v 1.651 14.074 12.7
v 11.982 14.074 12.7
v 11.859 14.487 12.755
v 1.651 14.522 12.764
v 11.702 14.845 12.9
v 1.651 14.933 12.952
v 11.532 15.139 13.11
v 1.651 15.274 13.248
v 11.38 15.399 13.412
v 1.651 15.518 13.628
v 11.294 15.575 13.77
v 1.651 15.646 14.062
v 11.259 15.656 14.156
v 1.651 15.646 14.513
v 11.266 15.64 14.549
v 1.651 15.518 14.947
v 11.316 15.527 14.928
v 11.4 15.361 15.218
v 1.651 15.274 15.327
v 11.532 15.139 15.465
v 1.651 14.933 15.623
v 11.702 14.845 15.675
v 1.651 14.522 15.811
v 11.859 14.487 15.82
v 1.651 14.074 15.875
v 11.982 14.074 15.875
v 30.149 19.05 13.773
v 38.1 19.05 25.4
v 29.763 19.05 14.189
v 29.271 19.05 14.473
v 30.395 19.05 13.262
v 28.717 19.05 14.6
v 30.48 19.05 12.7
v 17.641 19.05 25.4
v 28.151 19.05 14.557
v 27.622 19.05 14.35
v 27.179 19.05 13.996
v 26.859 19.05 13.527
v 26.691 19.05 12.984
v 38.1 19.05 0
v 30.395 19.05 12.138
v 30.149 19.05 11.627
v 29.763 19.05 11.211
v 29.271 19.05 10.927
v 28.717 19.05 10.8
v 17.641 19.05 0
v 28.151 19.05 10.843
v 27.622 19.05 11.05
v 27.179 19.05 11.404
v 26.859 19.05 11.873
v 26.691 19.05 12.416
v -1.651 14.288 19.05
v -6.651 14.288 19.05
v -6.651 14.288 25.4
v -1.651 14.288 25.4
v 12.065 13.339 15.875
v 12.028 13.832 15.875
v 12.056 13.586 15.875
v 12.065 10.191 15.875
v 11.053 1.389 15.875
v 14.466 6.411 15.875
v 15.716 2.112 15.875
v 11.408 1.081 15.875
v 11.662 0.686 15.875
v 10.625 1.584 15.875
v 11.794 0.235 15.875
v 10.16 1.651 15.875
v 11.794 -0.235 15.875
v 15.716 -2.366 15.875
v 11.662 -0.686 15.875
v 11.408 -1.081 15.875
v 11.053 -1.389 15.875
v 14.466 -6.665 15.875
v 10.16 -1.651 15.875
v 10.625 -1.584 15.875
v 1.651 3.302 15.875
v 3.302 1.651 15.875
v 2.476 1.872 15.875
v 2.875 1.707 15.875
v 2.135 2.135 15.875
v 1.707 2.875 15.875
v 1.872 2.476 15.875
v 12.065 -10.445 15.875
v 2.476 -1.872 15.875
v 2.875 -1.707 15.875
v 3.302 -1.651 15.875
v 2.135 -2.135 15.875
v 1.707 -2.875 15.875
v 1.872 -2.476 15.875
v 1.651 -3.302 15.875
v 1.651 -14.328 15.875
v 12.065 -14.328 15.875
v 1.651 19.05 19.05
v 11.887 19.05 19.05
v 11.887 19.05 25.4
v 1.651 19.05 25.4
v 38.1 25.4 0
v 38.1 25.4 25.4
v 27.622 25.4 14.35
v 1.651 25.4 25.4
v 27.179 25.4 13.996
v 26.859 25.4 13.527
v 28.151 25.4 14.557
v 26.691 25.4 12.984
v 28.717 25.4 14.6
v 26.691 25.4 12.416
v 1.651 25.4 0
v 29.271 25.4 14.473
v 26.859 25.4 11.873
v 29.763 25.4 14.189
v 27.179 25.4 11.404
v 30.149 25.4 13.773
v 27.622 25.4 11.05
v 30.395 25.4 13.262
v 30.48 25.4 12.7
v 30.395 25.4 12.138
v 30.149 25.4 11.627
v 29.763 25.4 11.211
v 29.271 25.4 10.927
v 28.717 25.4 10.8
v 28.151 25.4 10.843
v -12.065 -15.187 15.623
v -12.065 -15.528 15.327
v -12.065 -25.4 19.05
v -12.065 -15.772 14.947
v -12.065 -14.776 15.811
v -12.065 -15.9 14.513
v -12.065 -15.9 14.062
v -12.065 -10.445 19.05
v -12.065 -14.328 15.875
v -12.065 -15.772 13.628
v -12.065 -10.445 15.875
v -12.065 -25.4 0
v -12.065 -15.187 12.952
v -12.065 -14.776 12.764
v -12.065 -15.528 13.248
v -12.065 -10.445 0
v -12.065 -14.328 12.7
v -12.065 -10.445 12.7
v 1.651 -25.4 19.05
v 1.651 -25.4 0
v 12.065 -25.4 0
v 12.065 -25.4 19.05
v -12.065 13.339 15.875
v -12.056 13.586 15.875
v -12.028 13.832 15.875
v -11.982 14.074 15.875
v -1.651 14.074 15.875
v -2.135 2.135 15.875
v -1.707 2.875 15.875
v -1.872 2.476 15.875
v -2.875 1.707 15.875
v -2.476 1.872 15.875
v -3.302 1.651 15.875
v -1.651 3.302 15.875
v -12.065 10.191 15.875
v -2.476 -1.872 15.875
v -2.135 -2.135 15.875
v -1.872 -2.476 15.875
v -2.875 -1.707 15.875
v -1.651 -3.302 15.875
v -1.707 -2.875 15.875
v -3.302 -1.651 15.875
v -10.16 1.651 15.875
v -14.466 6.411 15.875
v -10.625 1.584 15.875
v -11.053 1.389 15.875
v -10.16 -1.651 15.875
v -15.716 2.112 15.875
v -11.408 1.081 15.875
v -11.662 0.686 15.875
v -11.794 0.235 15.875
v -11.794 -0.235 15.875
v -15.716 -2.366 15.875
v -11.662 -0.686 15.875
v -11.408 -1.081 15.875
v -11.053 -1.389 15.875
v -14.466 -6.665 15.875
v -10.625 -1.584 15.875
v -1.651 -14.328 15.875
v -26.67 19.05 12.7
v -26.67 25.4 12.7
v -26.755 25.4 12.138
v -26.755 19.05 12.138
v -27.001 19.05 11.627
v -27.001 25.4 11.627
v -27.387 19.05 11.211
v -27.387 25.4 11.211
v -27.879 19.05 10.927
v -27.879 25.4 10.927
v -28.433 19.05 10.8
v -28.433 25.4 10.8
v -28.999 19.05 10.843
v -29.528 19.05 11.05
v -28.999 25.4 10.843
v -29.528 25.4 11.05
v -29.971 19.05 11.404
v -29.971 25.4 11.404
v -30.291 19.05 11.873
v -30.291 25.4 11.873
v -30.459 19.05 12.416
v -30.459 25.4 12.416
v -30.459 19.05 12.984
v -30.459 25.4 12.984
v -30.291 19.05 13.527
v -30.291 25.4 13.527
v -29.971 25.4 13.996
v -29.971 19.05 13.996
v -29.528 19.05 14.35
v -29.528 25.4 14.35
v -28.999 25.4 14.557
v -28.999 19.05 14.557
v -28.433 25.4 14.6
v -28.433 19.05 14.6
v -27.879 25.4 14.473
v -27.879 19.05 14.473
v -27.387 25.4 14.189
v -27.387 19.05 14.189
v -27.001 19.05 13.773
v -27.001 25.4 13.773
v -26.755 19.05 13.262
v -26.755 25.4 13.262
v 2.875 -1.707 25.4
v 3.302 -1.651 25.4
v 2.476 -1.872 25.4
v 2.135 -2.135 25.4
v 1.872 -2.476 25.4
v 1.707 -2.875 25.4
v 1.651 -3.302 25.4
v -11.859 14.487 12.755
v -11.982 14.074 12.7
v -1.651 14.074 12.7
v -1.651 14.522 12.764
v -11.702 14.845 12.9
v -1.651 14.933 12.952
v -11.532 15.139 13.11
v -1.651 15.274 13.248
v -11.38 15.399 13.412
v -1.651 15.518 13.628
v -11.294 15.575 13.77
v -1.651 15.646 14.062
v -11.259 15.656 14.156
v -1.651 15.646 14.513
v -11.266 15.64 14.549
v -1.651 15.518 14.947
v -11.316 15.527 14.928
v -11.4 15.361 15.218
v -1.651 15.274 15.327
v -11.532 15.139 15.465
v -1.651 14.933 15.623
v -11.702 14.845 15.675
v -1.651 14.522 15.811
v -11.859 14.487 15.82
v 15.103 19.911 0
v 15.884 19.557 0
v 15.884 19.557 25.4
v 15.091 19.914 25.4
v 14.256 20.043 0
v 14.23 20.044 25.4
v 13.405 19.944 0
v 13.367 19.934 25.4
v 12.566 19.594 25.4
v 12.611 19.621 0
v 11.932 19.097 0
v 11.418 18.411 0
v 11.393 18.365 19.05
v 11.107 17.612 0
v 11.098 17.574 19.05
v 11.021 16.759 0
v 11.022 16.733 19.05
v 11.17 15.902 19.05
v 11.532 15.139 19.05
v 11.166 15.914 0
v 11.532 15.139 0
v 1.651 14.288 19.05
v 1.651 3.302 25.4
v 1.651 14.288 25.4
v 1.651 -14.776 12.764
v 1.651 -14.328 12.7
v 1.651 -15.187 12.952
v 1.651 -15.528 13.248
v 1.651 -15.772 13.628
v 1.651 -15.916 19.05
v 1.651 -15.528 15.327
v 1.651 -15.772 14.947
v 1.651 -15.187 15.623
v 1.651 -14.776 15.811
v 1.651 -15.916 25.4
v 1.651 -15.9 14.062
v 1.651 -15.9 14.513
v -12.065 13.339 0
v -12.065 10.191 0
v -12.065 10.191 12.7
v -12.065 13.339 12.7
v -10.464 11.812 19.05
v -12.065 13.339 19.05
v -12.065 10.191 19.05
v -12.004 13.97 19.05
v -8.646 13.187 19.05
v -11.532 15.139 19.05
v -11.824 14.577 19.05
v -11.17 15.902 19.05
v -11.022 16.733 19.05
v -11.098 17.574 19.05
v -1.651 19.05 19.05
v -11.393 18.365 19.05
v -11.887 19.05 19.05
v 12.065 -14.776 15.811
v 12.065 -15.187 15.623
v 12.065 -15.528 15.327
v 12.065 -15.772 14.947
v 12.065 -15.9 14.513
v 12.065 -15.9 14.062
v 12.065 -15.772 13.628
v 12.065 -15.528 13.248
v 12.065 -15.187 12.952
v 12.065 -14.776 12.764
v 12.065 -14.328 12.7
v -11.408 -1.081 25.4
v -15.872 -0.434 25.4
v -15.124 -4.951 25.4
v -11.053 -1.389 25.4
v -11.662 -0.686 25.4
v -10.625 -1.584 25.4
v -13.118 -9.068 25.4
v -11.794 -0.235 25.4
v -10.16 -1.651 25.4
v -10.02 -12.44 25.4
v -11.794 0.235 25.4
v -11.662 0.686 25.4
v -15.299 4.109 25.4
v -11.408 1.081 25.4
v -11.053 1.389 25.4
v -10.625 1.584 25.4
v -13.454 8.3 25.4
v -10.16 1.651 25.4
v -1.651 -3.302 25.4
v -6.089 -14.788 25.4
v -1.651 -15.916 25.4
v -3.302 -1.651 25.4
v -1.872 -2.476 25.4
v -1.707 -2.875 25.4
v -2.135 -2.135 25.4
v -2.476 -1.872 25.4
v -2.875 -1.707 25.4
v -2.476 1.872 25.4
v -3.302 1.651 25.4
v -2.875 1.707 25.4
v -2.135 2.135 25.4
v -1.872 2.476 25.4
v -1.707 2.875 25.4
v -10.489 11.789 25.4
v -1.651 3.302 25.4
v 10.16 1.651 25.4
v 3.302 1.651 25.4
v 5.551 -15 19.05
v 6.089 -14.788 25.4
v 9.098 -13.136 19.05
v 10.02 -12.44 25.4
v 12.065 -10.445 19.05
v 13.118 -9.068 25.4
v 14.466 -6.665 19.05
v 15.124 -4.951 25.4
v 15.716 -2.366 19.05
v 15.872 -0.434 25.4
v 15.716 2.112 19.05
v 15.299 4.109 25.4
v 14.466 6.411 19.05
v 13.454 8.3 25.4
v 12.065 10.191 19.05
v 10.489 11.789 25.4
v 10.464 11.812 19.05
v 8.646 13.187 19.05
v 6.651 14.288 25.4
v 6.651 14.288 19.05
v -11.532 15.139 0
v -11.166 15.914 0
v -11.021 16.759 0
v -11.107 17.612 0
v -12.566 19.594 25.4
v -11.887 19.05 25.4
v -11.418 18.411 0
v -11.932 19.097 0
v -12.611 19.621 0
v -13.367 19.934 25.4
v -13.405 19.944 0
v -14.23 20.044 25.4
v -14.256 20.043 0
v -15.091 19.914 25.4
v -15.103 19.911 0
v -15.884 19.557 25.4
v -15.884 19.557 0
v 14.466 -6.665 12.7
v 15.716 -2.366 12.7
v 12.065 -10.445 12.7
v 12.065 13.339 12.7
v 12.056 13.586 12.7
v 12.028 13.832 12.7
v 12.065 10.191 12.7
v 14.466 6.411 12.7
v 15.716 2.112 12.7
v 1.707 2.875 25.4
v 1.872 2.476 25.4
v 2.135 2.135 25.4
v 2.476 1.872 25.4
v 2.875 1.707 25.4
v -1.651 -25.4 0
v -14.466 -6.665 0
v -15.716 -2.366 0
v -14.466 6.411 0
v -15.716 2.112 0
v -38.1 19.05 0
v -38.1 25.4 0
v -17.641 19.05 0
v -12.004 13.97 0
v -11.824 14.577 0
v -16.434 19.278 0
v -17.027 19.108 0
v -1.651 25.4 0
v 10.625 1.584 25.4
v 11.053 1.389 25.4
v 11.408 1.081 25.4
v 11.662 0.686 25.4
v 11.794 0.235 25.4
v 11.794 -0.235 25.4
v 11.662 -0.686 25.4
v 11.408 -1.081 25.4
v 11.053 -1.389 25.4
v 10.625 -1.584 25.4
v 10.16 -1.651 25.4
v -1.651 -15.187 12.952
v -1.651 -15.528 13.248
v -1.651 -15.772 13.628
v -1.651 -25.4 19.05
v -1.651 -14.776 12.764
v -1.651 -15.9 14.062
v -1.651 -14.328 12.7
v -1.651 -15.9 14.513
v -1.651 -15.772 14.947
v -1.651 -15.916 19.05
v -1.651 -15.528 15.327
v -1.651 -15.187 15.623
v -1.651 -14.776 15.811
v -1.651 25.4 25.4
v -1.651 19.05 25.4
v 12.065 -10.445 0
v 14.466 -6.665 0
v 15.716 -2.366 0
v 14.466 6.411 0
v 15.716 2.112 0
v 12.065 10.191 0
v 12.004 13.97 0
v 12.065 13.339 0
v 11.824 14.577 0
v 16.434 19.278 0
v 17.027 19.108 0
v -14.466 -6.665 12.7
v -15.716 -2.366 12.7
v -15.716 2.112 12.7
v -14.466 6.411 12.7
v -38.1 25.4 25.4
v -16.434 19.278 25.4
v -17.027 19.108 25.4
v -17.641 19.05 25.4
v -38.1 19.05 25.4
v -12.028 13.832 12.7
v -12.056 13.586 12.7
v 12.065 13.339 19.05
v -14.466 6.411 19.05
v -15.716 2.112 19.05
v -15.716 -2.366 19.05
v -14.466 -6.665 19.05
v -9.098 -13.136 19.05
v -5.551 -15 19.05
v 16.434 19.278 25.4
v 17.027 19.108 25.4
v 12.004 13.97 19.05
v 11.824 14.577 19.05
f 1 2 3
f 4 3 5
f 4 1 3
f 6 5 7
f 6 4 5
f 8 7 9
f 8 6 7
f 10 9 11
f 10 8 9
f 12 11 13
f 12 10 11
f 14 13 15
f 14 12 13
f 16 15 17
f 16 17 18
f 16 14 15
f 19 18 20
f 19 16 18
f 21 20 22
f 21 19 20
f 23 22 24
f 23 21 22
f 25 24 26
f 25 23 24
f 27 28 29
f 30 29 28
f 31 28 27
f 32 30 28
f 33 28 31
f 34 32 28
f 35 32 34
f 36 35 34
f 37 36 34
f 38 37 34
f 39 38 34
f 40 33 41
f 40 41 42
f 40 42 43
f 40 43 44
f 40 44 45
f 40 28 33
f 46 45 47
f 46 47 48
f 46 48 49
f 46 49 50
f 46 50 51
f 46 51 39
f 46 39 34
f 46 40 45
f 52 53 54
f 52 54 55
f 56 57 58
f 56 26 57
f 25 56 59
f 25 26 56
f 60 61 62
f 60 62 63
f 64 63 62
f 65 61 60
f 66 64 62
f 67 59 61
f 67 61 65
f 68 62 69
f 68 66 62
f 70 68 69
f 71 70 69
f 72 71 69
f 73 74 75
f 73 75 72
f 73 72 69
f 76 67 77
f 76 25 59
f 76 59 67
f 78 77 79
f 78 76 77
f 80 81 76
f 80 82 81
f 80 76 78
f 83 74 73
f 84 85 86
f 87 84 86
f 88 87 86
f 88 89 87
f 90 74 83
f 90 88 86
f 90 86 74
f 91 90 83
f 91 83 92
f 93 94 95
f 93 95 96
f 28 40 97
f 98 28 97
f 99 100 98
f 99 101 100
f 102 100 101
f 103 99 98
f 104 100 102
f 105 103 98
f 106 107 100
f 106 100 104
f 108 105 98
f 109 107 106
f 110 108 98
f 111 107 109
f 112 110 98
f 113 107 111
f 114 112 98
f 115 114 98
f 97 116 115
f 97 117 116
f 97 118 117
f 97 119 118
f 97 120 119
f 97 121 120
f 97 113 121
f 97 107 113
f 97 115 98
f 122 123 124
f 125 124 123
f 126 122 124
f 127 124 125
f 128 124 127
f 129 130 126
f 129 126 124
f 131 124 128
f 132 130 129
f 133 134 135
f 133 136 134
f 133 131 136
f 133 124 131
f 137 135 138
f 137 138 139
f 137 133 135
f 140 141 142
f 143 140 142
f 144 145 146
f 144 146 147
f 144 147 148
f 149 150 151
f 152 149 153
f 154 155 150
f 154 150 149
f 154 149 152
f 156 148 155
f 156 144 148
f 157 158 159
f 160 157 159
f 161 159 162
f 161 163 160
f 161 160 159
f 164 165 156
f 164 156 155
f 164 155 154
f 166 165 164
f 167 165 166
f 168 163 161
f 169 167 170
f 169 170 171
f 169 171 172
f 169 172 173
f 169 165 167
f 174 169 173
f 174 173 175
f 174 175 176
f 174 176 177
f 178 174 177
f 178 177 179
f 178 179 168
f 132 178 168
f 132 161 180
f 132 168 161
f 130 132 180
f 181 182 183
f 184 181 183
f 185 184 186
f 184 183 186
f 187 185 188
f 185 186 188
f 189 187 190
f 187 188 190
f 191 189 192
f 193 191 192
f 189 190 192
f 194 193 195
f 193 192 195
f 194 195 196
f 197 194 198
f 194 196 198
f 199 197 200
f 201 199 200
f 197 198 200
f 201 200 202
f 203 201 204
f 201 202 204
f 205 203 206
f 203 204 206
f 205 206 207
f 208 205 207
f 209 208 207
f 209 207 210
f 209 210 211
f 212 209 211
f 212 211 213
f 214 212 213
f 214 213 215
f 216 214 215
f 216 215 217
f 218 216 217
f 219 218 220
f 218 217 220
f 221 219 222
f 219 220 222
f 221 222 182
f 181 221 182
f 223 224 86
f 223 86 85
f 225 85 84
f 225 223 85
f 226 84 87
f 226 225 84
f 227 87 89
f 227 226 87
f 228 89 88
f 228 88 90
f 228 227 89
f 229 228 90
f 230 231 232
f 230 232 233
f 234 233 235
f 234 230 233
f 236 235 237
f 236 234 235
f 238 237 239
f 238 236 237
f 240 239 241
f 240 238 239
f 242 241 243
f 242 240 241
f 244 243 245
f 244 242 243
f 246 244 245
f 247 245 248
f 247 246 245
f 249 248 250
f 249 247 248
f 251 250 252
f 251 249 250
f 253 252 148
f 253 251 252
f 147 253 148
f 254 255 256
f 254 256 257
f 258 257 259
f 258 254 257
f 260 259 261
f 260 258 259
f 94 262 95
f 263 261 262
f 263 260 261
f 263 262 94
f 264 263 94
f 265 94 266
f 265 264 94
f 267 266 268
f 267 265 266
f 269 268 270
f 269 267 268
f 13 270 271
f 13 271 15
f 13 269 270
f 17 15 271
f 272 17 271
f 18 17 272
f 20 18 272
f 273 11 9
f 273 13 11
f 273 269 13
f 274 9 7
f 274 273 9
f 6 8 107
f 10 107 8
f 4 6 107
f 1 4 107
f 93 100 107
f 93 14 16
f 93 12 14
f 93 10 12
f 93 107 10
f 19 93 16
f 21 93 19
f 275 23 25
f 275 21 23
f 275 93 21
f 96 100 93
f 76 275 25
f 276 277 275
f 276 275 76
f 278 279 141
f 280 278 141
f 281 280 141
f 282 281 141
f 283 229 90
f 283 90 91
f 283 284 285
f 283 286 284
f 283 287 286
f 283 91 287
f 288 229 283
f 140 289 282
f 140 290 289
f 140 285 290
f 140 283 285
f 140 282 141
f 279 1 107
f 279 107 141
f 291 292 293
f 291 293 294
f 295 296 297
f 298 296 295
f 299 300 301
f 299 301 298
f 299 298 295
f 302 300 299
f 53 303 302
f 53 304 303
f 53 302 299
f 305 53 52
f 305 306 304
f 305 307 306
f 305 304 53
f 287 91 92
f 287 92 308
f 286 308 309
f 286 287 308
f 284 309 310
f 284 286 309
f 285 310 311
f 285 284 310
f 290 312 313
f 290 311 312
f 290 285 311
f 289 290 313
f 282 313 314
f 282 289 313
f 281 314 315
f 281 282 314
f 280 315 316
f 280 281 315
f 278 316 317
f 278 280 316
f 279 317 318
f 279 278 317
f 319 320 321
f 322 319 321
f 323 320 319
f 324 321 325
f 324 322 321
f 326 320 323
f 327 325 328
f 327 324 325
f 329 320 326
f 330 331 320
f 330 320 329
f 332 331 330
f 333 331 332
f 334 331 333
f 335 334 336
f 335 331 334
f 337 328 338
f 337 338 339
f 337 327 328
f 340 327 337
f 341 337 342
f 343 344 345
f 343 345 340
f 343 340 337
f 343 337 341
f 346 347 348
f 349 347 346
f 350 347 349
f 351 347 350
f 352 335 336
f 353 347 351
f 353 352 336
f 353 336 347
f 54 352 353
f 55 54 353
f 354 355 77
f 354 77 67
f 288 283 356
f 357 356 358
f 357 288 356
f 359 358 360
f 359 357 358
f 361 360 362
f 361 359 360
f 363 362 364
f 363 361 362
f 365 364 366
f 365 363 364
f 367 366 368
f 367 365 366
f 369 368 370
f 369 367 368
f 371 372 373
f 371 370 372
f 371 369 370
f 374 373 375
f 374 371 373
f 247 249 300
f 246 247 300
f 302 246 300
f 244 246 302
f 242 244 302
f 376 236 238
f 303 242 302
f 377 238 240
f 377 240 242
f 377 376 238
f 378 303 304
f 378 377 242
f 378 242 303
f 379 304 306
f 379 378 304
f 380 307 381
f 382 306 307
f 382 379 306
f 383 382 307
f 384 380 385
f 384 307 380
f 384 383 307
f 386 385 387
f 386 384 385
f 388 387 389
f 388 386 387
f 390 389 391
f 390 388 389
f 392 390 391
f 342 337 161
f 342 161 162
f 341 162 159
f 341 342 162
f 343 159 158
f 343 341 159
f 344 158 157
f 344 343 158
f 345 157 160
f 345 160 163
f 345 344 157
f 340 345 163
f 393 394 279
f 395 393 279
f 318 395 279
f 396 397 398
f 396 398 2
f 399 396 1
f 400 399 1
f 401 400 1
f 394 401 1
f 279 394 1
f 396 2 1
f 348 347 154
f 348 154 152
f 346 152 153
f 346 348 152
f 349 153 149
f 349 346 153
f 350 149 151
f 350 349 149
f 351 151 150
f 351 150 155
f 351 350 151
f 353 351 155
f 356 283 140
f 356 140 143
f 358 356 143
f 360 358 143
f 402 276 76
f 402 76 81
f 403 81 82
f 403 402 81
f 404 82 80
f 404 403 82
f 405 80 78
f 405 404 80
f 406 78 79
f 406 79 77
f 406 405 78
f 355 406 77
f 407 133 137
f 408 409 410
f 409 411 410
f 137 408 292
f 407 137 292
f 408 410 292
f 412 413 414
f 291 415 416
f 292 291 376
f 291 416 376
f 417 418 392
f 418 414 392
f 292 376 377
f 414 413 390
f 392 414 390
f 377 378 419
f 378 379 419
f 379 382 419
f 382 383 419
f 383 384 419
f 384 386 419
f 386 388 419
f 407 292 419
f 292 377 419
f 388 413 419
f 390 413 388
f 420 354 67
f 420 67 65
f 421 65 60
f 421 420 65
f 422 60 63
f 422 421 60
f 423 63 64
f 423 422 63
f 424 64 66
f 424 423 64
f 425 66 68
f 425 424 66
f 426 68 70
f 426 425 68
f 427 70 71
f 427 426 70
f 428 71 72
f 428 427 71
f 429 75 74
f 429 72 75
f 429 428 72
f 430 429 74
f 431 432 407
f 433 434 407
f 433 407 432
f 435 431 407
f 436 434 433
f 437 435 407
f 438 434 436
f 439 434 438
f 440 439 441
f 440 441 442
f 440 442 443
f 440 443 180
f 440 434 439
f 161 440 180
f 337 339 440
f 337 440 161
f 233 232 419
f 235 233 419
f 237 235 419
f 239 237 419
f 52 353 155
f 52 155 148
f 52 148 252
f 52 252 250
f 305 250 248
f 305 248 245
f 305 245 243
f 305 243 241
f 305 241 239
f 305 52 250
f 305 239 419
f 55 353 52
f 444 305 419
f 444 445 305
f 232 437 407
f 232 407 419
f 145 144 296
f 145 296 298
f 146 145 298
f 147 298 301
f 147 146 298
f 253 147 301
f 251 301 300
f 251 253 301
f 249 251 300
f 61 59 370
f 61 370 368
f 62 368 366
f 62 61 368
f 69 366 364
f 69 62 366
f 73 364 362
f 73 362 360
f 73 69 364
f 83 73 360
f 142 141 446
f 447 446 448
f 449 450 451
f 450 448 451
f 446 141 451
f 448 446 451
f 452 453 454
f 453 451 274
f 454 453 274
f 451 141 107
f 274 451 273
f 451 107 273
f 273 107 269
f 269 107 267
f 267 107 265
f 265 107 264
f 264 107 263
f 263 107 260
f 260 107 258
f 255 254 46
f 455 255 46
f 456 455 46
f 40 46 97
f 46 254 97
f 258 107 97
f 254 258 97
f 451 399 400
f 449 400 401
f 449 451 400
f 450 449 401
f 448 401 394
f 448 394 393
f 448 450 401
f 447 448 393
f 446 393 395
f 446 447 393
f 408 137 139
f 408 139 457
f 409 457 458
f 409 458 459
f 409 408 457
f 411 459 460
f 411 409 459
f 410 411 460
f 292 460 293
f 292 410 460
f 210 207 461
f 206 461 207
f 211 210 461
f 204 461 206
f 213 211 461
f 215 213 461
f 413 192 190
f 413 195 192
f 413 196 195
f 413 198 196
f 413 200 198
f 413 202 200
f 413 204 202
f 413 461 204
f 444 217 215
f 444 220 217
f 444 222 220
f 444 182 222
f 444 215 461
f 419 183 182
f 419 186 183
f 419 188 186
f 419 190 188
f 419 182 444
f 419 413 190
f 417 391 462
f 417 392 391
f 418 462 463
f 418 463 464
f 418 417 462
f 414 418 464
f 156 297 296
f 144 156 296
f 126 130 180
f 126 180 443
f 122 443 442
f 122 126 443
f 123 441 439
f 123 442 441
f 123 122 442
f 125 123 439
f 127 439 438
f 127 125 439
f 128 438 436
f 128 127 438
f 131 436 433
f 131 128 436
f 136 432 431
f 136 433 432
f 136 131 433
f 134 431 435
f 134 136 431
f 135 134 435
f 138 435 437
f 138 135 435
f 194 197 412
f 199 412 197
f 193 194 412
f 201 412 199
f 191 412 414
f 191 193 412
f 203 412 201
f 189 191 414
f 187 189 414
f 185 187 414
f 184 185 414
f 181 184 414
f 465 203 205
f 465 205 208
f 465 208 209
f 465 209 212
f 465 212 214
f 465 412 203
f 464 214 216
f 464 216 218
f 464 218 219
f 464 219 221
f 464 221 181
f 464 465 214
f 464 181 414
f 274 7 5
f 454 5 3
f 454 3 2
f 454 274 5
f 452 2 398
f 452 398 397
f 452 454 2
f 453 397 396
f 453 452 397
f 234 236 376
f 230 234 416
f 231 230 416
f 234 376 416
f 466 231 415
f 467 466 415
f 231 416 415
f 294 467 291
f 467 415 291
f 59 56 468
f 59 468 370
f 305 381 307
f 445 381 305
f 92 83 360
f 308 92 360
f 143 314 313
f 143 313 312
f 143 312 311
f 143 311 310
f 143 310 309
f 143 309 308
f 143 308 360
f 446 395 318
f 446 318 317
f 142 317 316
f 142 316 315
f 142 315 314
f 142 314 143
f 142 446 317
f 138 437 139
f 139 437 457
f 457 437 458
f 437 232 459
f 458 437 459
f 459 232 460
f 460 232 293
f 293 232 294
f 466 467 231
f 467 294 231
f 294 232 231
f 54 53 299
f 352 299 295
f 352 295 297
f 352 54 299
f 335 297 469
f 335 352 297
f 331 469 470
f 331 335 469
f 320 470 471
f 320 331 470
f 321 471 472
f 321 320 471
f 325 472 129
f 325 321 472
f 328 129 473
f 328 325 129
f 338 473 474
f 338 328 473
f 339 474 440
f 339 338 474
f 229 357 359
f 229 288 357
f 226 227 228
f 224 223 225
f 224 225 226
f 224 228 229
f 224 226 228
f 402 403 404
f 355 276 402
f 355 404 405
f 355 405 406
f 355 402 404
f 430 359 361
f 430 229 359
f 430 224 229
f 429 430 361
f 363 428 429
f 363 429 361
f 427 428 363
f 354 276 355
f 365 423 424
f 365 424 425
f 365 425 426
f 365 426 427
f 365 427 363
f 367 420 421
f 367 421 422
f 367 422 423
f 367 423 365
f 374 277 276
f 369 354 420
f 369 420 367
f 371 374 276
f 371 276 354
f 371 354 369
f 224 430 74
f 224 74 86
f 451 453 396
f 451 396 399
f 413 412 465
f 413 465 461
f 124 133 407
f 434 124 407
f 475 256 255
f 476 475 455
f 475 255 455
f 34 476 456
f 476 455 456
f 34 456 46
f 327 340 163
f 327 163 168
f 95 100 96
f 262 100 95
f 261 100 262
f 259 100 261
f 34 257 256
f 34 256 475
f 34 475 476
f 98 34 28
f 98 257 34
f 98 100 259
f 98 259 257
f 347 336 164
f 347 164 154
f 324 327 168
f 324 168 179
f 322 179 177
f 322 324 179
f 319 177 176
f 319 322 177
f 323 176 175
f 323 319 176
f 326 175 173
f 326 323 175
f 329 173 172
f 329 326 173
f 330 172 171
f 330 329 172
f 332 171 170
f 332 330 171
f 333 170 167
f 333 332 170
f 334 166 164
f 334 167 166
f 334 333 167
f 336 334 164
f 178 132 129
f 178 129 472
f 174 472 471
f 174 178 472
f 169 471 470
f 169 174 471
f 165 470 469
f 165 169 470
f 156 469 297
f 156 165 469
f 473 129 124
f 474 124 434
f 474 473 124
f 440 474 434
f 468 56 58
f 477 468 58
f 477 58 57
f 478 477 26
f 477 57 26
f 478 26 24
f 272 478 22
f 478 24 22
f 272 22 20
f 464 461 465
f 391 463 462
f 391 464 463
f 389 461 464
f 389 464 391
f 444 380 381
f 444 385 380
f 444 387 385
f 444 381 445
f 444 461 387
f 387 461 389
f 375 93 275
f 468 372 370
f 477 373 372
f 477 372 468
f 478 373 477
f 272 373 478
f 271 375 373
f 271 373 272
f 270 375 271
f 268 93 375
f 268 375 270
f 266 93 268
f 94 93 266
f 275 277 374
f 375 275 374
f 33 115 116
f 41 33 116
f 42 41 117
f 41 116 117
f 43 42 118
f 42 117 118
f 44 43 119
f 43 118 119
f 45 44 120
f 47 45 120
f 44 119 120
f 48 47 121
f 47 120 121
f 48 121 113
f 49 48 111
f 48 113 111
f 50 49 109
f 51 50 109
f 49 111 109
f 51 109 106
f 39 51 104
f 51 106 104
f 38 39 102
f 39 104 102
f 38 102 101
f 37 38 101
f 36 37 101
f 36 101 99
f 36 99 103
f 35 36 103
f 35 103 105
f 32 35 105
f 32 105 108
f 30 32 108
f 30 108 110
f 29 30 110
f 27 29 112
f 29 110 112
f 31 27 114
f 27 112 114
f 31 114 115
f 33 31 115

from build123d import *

# Parameters (mm, degrees)
SKETCH1_W           = 76.2
SKETCH1_H           = 50.8
BOSS_EXTRUDE1_DEPTH = 25.4
SKETCH2_W           = 76.2
SKETCH2_H           = 44.45
SKETCH2_R           = 15.875
CUT_EXTRUDE1_DEPTH  = 6.35
CUT_EXTRUDE2_DEPTH  = 12.7
CUT_EXTRUDE3_START  = -19.05
CUT_EXTRUDE3_DEPTH  = 19.05
CUT_EXTRUDE4_START  = -15.875
CUT_EXTRUDE4_DEPTH  = 31.75
CUT_EXTRUDE5_START  = -19.05
SKETCH7_R           = 3.175
CUT_EXTRUDE5_DEPTH  = 25.4
FILLET1_R           = 3.302
SKETCH8_R           = 1.905
CUT_EXTRUDE6_DEPTH  = 6.35
SKETCH9_W           = 3.302
SKETCH9_H           = 50.8
CUT_EXTRUDE7_DEPTH  = 12.7
SKETCH10_W          = 23.773678362
SKETCH10_H          = 4.7625
CUT_EXTRUDE8_DEPTH  = 6.35


with BuildPart() as part:
    # Sketch1 → Boss-Extrude1 (new body)
    with BuildSketch(Plane.XY):
        Rectangle(SKETCH1_W, SKETCH1_H)
    extrude(amount=BOSS_EXTRUDE1_DEPTH)

    # Sketch2 → Cut-Extrude1 (cut)
    with BuildSketch(Plane.XY.offset(25.4)):
        with Locations((0, -3.175)):
            Rectangle(SKETCH2_W, SKETCH2_H)
        with Locations((0, -0.127)):
            Circle(SKETCH2_R, mode=Mode.SUBTRACT)
    extrude(amount=-CUT_EXTRUDE1_DEPTH, mode=Mode.SUBTRACT)

    # Sketch3 → Cut-Extrude2 (cut)
    with BuildSketch(Plane.XY.offset(25.4)):
        with BuildLine():
            Line((10.16, -1.651), (3.302, -1.651))
            ThreePointArc((3.302, -1.651), (2.134566704, -2.134566704), (1.651, -3.302))
            Line((1.651, -3.302), (1.651, -25.4))
            Line((1.651, -25.4), (-1.651, -25.4))
            Line((-1.651, -25.4), (-1.651, -3.302))
            ThreePointArc((-1.651, -3.302), (-2.134566704, -2.134566704), (-3.302, -1.651))
            Line((-3.302, -1.651), (-10.16, -1.651))
            ThreePointArc((-10.16, -1.651), (-11.811, 0), (-10.16, 1.651))
            Line((-10.16, 1.651), (-3.302, 1.651))
            ThreePointArc((-3.302, 1.651), (-2.134566704, 2.134566704), (-1.651, 3.302))
            Line((-1.651, 3.302), (-1.651, 25.4))
            Line((-1.651, 25.4), (1.651, 25.4))
            Line((1.651, 25.4), (1.651, 3.302))
            ThreePointArc((1.651, 3.302), (2.134566704, 2.134566704), (3.302, 1.651))
            Line((3.302, 1.651), (10.16, 1.651))
            ThreePointArc((10.16, 1.651), (11.811, 0), (10.16, -1.651))
        make_face()
    extrude(amount=-CUT_EXTRUDE2_DEPTH, mode=Mode.SUBTRACT)

    # Sketch4 → Cut-Extrude3 (cut)
    with BuildSketch(Plane.XY.offset(19.05).offset(CUT_EXTRUDE3_START)):
        with BuildLine():
            Line((12.065, -25.4), (38.1, -25.4))
            Line((38.1, -25.4), (38.1, 19.05))
            Line((38.1, 19.05), (12.065, 19.05))
            Line((12.065, 19.05), (12.065, 10.190528774))
            ThreePointArc((12.065, 10.190528774), (15.875, -0.127), (12.065, -10.444528774))
            Line((12.065, -10.444528774), (12.065, -25.4))
        make_face()
        with BuildLine():
            Line((-12.065, 10.190528774), (-12.065, 19.05))
            Line((-12.065, 19.05), (-38.1, 19.05))
            Line((-38.1, 19.05), (-38.1, -25.4))
            Line((-38.1, -25.4), (-12.065, -25.4))
            Line((-12.065, -25.4), (-12.065, -10.444528774))
            ThreePointArc((-12.065, -10.444528774), (-15.875, -0.127), (-12.065, 10.190528774))
        make_face()
    extrude(amount=CUT_EXTRUDE3_DEPTH, mode=Mode.SUBTRACT)

    # Sketch6 → Cut-Extrude4 (cut)
    with BuildSketch(Plane(origin=(0, 0, 0), x_dir=(0, 0, -1), z_dir=(1, 0, 0)).offset(CUT_EXTRUDE4_START)):
        with BuildLine():
            Line((-12.7, -14.328414592), (-12.7, 14.074414592))
            ThreePointArc((-12.7, 14.074414592), (-14.2875, 15.661914592), (-15.875, 14.074414592))
            Line((-15.875, 14.074414592), (-15.875, -14.328414592))
            ThreePointArc((-15.875, -14.328414592), (-14.2875, -15.915914592), (-12.7, -14.328414592))
        make_face()
    extrude(amount=CUT_EXTRUDE4_DEPTH, mode=Mode.SUBTRACT)

    # Sketch7 → Cut-Extrude5 (cut)
    with BuildSketch(Plane.XY.offset(19.05).offset(CUT_EXTRUDE5_START)):
        with Locations((14.193918487, 16.868713665)):
            Circle(SKETCH7_R)
        with Locations((-14.193918487, 16.868713665)):
            Circle(SKETCH7_R)
    extrude(amount=CUT_EXTRUDE5_DEPTH, mode=Mode.SUBTRACT)

    # Fillet1
    fillet1_edges = [part.edges().sort_by_distance(p)[0] for p in [
        (-12.065, 14.513224103, 6.380925895),
        (-12.065, 14.513224103, 17.431574105),
        (-16.500997793, 19.05, 9.525),
        (12.065, 14.513224103, 6.380925895),
        (12.065, 14.513224103, 17.431574105),
        (16.500997793, 19.05, 9.525),
    ]]
    fillet(fillet1_edges, radius=FILLET1_R)

    # Sketch8 → Cut-Extrude6 (cut)
    with BuildSketch(Plane(origin=(0, 25.4, 0), x_dir=(1, 0, 0), z_dir=(0, 1, 0))):
        with Locations((-28.575, -12.7)):
            Circle(SKETCH8_R)
        with Locations((28.575, -12.7)):
            Circle(SKETCH8_R)
    extrude(amount=-CUT_EXTRUDE6_DEPTH, mode=Mode.SUBTRACT)

    # Sketch9 → Cut-Extrude7 (cut)
    with BuildSketch(Plane.XY.offset(12.7)):
        Rectangle(SKETCH9_W, SKETCH9_H)
    extrude(amount=-CUT_EXTRUDE7_DEPTH, mode=Mode.SUBTRACT)

    # Sketch10 → Cut-Extrude8 (cut)
    with BuildSketch(Plane.XY.offset(19.05)):
        with Locations((0, 16.66875)):
            Rectangle(SKETCH10_W, SKETCH10_H)
    extrude(amount=CUT_EXTRUDE8_DEPTH, mode=Mode.SUBTRACT)


solid = part.part
